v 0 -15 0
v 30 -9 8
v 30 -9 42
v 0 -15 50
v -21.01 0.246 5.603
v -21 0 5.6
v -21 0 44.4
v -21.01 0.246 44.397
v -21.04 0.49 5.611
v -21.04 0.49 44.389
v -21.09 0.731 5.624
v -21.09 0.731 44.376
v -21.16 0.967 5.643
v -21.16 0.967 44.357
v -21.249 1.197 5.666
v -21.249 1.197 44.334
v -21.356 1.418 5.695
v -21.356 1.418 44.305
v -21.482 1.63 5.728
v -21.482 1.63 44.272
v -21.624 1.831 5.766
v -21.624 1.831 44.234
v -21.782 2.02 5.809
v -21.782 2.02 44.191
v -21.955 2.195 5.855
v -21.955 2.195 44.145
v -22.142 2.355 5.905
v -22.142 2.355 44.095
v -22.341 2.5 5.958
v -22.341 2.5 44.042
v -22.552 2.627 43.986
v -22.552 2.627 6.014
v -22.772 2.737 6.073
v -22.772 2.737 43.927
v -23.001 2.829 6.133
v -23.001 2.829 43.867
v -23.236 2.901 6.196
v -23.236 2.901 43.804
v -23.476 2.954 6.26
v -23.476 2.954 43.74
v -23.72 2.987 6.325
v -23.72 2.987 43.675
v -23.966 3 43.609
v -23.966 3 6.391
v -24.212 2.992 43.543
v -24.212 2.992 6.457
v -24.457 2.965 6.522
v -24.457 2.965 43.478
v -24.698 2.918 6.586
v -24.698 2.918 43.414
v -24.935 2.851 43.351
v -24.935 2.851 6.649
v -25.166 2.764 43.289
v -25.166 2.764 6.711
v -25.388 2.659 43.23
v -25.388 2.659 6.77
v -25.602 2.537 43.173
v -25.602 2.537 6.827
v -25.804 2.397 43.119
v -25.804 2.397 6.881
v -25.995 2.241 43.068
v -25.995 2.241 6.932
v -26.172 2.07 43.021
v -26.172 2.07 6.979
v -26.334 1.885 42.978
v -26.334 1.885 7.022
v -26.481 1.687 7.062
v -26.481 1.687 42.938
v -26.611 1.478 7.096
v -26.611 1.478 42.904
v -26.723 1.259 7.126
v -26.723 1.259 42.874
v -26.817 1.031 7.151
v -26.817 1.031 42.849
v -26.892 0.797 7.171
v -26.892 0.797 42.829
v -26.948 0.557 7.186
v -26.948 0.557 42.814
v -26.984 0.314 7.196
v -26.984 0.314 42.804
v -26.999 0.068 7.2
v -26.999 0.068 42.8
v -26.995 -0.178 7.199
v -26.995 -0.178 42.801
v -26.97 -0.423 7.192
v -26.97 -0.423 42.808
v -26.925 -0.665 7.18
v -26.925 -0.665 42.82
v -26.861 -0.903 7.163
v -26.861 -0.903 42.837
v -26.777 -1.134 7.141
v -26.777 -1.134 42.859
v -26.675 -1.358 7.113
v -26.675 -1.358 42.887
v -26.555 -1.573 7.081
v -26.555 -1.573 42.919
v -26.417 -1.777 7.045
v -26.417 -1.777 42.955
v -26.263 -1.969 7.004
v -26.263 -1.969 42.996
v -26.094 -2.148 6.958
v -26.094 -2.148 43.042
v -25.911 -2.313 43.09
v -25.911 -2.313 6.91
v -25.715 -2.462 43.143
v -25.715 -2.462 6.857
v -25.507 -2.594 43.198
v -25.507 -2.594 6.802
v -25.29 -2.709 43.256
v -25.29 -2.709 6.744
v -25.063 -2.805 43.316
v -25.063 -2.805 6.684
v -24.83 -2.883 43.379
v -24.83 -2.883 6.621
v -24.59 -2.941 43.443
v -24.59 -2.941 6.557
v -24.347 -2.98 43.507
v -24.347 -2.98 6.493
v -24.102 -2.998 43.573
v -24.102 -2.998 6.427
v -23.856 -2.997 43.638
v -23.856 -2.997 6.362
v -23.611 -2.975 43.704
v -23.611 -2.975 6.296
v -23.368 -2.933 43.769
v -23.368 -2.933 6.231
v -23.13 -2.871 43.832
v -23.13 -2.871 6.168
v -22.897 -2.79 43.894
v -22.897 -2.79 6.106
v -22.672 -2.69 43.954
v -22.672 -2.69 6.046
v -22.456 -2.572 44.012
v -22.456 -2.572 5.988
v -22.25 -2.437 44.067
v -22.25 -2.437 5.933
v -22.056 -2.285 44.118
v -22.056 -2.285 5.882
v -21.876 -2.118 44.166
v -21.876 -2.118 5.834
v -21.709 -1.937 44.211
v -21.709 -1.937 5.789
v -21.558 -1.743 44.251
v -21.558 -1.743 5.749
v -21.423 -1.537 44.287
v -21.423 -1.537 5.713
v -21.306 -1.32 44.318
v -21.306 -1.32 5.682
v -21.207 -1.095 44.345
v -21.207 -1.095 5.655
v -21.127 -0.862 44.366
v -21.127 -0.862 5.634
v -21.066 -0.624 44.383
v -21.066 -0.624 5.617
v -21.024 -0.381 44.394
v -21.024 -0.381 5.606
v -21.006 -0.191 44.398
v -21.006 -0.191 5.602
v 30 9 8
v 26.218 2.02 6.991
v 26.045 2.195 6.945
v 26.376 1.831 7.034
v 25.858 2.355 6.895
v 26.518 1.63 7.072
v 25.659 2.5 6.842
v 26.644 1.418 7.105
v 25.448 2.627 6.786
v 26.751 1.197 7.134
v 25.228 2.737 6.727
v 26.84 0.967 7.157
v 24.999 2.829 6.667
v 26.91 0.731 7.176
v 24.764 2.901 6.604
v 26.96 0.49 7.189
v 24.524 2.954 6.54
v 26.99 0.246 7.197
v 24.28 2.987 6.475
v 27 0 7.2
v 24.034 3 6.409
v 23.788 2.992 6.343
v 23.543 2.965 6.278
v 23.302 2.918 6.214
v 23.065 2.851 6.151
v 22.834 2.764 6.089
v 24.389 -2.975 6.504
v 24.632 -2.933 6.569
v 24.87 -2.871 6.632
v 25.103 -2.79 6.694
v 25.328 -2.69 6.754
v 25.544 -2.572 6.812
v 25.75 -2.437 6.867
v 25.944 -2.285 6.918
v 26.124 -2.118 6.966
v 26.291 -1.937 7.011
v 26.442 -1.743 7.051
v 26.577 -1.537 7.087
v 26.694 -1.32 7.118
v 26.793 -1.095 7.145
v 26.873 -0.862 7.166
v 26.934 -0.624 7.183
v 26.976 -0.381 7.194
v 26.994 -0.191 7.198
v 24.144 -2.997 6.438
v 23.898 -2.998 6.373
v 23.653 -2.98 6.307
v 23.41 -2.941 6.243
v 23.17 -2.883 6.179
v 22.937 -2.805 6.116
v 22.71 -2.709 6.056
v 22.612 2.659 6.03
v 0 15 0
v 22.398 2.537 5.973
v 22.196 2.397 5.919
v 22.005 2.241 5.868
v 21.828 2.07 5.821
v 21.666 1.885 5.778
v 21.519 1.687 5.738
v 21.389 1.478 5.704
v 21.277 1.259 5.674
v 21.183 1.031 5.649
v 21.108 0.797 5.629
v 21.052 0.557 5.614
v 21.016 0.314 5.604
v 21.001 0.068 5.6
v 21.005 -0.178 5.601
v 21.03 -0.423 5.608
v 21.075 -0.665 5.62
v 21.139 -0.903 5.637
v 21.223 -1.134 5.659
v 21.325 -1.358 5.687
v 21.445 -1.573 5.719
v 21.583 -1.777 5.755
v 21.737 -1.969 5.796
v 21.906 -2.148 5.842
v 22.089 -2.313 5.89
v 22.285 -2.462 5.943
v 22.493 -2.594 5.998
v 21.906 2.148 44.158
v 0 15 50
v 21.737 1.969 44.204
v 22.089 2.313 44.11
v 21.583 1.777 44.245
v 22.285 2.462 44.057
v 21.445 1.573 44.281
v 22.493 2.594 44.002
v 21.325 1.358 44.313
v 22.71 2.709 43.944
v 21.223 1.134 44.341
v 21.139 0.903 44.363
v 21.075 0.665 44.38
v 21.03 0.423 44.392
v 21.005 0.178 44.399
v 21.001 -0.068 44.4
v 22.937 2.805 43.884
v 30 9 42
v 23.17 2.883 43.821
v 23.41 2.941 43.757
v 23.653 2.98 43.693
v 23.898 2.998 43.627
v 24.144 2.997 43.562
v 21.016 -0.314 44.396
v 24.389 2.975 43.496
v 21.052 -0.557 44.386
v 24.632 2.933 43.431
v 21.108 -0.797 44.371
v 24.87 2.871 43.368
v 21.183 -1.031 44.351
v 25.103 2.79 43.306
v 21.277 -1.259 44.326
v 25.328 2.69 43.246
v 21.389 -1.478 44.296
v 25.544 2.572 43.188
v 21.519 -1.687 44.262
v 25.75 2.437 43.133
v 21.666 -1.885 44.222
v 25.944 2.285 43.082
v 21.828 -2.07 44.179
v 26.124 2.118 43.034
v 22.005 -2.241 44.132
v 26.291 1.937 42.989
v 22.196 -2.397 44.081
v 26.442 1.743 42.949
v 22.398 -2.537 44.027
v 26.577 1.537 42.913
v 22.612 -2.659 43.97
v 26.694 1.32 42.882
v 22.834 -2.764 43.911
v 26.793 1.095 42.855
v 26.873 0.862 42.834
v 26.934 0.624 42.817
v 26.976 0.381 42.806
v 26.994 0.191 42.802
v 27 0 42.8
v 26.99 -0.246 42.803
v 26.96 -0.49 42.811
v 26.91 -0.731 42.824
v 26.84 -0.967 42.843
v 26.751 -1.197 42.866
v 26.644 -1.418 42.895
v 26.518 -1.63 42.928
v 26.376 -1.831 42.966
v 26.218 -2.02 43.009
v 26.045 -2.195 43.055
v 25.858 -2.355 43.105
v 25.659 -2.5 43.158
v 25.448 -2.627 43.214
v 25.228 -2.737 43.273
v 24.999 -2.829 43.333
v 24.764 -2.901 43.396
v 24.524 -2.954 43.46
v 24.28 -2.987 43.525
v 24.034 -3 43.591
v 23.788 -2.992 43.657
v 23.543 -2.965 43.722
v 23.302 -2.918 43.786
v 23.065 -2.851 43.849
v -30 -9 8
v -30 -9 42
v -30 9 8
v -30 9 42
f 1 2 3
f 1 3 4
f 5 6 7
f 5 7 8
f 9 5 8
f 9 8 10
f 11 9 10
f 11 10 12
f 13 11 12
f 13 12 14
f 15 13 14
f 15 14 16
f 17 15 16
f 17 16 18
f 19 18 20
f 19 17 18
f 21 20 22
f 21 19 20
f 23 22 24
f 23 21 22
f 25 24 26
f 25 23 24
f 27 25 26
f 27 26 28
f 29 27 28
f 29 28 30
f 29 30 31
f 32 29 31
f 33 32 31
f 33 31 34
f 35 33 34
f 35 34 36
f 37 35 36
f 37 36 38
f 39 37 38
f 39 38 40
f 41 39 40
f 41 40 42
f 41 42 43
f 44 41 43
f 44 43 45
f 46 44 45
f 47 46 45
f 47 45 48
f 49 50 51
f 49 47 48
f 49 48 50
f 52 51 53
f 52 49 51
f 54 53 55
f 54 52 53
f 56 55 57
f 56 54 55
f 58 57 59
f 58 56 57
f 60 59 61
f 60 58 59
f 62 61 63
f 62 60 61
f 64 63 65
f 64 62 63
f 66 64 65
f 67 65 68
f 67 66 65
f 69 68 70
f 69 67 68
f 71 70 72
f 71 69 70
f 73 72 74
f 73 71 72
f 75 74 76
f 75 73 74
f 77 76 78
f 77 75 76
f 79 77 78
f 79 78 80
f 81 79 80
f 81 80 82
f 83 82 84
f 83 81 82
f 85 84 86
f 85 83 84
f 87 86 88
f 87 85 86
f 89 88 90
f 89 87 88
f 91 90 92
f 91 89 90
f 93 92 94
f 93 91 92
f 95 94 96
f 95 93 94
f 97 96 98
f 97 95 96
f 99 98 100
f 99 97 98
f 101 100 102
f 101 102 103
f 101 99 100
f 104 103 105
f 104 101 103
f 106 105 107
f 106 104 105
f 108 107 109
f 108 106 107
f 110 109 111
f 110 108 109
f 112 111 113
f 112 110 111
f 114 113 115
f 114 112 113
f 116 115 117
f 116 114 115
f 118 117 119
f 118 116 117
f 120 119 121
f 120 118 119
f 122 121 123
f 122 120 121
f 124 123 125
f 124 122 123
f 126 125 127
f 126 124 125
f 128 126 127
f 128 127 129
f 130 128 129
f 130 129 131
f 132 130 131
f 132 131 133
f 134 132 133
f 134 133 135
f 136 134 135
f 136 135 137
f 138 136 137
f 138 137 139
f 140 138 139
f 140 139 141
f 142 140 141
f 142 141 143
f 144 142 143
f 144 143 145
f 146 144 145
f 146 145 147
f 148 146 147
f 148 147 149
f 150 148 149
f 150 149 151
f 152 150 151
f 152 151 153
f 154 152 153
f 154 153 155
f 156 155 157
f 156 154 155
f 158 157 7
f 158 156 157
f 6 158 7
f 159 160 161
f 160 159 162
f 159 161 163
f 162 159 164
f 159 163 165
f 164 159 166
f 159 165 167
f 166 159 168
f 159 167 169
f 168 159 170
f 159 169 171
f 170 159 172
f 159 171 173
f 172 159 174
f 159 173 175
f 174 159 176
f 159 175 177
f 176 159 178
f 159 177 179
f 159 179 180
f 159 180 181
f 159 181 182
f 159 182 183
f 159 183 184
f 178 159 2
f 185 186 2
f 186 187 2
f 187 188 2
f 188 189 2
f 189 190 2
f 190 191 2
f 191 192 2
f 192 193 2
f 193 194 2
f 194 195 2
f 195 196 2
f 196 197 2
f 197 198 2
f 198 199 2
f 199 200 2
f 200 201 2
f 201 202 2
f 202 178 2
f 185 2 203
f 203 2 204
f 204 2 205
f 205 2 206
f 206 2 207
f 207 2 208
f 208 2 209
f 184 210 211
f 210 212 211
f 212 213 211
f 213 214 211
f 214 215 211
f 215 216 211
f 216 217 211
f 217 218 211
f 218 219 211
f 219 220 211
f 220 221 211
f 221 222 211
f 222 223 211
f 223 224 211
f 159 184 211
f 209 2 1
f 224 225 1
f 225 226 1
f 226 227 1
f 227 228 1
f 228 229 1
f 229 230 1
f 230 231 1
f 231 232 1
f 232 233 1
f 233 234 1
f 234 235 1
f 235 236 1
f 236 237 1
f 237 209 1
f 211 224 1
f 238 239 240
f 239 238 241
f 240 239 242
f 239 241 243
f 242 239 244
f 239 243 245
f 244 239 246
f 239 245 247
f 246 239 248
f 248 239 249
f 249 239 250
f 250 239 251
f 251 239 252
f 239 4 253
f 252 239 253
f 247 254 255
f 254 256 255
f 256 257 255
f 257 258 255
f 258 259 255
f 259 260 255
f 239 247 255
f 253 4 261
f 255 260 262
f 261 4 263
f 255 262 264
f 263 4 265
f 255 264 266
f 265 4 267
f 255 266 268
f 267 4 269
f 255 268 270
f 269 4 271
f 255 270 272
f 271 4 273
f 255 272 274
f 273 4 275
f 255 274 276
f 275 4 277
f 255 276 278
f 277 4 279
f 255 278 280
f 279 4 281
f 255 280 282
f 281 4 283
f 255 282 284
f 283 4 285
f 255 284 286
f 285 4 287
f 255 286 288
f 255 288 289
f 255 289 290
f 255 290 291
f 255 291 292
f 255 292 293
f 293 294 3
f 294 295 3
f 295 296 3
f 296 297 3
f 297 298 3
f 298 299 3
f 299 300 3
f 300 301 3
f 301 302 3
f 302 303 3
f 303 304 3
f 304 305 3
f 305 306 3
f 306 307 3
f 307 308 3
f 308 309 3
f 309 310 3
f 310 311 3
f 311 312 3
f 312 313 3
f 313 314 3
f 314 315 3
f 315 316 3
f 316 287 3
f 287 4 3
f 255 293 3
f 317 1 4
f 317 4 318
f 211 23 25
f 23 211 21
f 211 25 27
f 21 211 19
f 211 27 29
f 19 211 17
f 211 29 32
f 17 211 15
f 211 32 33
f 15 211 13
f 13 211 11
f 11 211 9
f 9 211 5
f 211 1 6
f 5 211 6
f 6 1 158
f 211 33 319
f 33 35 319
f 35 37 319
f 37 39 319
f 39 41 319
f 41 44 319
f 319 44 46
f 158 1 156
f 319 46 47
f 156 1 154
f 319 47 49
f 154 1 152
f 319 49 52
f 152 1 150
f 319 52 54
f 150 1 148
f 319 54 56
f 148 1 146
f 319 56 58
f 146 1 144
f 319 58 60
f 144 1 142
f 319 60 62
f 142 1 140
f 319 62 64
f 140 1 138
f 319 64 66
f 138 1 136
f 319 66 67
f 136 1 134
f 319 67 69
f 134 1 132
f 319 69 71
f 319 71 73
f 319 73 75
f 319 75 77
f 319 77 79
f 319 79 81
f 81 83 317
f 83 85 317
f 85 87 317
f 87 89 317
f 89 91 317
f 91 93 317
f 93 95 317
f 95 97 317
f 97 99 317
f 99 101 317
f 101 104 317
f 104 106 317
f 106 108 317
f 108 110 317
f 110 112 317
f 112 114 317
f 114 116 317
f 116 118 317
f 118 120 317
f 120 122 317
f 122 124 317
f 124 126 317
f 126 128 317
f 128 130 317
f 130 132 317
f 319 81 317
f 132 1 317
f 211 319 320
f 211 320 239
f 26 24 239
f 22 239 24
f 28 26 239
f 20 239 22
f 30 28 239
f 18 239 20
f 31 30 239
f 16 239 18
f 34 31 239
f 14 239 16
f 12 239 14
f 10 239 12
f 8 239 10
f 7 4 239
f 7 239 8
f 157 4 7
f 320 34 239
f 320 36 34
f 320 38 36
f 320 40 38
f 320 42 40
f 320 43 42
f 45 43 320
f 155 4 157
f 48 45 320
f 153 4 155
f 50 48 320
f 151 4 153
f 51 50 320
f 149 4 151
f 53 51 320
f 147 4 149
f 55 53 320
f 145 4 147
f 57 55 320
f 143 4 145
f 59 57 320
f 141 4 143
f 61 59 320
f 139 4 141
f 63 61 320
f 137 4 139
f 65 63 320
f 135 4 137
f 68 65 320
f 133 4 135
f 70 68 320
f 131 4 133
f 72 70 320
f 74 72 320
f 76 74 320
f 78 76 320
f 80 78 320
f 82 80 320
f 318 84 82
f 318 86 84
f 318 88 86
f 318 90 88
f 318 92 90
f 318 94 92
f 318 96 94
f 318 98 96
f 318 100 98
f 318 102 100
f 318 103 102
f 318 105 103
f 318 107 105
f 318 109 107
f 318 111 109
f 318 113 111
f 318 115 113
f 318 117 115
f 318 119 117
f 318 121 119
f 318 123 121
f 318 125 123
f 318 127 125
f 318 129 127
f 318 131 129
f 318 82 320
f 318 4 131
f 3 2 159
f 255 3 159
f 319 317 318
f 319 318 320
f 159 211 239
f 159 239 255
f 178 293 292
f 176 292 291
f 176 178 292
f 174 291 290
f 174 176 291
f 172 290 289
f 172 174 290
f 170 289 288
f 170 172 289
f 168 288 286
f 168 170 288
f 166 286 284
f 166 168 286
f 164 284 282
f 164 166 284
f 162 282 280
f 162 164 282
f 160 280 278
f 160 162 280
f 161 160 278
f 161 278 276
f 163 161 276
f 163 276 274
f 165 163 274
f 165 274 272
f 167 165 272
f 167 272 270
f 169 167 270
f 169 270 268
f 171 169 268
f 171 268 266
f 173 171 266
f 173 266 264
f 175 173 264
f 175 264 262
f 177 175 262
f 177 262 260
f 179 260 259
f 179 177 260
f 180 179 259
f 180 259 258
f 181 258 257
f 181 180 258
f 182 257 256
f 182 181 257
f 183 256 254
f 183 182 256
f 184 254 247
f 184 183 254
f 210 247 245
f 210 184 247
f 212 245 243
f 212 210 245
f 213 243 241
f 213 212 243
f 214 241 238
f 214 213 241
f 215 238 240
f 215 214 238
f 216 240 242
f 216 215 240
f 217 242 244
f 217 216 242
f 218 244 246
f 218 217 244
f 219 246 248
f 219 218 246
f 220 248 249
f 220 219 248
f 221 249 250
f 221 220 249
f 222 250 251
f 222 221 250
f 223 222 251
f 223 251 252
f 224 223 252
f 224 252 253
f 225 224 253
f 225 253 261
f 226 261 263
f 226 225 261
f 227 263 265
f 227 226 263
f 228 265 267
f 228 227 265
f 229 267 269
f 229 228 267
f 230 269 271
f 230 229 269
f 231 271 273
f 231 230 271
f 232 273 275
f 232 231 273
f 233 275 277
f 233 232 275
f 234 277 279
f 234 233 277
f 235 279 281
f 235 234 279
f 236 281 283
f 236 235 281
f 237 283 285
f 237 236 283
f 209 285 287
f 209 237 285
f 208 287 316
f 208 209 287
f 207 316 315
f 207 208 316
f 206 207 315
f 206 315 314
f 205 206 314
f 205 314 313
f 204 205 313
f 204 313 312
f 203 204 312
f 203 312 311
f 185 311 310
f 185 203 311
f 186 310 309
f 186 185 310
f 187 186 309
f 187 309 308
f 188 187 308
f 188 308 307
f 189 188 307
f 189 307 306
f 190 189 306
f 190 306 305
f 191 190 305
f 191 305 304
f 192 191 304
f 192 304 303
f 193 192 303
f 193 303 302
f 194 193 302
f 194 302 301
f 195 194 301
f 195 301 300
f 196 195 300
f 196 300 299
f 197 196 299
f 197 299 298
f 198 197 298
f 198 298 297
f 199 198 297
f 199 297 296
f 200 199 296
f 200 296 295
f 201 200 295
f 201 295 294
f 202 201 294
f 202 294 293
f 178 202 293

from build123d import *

# Parameters (mm, degrees)
SKETCH1_W               = 60
SKETCH1_H               = 30
BOSS_EXTRUDE1_DEPTH     = 50
CUT_EXTRUDE1_DEPTH      = 50
CUT_EXTRUDE2_DEPTH      = 61.207972894
CUT_EXTRUDE2_DEPTH_BACK = 61.207972894
CUT_EXTRUDE4_DEPTH      = 61.207972894
CUT_EXTRUDE4_DEPTH_BACK = 61.207972894
SKETCH5_R               = 3


with BuildPart() as part:
    # Sketch1 → Boss-Extrude1 (new body)
    with BuildSketch(Plane.XY):
        Rectangle(SKETCH1_W, SKETCH1_H)
    extrude(amount=BOSS_EXTRUDE1_DEPTH)

    # Sketch2 → Cut-Extrude1 (cut)
    with BuildSketch(Plane.XY.offset(50)):
        Polygon((-30, 9), (0, 15), (-30, 15), align=None)
        Polygon((30, 15), (0, 15), (30, 9), align=None)
        Polygon((0, -15), (-30, -9), (-30, -15), align=None)
        Polygon((30, -15), (30, -9), (0, -15), align=None)
    extrude(amount=-CUT_EXTRUDE1_DEPTH, mode=Mode.SUBTRACT)

    # Sketch4 → Cut-Extrude2 (cut, two sides: drawn at the far end of the back side and taken through both)
    with BuildSketch(Plane(origin=(0, 0, 0), x_dir=(1, 0, 0), z_dir=(0, 1, 0)).offset(-CUT_EXTRUDE2_DEPTH_BACK)):
        Polygon((-30, 0), (0, 0), (-30, -8), align=None)
        Polygon((30, 0), (30, -8), (0, 0), align=None)
        Polygon((30, -50), (0, -50), (30, -42), align=None)
        Polygon((-30, -42), (-30, -50), (0, -50), align=None)
    extrude(amount=CUT_EXTRUDE2_DEPTH + CUT_EXTRUDE2_DEPTH_BACK, mode=Mode.SUBTRACT)

    # Sketch5 → Cut-Extrude4 (cut, two sides: drawn at the far end of the back side and taken through both)
    with BuildSketch(Plane.XY.offset(-CUT_EXTRUDE4_DEPTH_BACK)):
        with Locations((-24, 0)):
            Circle(SKETCH5_R)
        with Locations((24, 0)):
            Circle(SKETCH5_R)
    extrude(amount=CUT_EXTRUDE4_DEPTH + CUT_EXTRUDE4_DEPTH_BACK, mode=Mode.SUBTRACT)


solid = part.part
